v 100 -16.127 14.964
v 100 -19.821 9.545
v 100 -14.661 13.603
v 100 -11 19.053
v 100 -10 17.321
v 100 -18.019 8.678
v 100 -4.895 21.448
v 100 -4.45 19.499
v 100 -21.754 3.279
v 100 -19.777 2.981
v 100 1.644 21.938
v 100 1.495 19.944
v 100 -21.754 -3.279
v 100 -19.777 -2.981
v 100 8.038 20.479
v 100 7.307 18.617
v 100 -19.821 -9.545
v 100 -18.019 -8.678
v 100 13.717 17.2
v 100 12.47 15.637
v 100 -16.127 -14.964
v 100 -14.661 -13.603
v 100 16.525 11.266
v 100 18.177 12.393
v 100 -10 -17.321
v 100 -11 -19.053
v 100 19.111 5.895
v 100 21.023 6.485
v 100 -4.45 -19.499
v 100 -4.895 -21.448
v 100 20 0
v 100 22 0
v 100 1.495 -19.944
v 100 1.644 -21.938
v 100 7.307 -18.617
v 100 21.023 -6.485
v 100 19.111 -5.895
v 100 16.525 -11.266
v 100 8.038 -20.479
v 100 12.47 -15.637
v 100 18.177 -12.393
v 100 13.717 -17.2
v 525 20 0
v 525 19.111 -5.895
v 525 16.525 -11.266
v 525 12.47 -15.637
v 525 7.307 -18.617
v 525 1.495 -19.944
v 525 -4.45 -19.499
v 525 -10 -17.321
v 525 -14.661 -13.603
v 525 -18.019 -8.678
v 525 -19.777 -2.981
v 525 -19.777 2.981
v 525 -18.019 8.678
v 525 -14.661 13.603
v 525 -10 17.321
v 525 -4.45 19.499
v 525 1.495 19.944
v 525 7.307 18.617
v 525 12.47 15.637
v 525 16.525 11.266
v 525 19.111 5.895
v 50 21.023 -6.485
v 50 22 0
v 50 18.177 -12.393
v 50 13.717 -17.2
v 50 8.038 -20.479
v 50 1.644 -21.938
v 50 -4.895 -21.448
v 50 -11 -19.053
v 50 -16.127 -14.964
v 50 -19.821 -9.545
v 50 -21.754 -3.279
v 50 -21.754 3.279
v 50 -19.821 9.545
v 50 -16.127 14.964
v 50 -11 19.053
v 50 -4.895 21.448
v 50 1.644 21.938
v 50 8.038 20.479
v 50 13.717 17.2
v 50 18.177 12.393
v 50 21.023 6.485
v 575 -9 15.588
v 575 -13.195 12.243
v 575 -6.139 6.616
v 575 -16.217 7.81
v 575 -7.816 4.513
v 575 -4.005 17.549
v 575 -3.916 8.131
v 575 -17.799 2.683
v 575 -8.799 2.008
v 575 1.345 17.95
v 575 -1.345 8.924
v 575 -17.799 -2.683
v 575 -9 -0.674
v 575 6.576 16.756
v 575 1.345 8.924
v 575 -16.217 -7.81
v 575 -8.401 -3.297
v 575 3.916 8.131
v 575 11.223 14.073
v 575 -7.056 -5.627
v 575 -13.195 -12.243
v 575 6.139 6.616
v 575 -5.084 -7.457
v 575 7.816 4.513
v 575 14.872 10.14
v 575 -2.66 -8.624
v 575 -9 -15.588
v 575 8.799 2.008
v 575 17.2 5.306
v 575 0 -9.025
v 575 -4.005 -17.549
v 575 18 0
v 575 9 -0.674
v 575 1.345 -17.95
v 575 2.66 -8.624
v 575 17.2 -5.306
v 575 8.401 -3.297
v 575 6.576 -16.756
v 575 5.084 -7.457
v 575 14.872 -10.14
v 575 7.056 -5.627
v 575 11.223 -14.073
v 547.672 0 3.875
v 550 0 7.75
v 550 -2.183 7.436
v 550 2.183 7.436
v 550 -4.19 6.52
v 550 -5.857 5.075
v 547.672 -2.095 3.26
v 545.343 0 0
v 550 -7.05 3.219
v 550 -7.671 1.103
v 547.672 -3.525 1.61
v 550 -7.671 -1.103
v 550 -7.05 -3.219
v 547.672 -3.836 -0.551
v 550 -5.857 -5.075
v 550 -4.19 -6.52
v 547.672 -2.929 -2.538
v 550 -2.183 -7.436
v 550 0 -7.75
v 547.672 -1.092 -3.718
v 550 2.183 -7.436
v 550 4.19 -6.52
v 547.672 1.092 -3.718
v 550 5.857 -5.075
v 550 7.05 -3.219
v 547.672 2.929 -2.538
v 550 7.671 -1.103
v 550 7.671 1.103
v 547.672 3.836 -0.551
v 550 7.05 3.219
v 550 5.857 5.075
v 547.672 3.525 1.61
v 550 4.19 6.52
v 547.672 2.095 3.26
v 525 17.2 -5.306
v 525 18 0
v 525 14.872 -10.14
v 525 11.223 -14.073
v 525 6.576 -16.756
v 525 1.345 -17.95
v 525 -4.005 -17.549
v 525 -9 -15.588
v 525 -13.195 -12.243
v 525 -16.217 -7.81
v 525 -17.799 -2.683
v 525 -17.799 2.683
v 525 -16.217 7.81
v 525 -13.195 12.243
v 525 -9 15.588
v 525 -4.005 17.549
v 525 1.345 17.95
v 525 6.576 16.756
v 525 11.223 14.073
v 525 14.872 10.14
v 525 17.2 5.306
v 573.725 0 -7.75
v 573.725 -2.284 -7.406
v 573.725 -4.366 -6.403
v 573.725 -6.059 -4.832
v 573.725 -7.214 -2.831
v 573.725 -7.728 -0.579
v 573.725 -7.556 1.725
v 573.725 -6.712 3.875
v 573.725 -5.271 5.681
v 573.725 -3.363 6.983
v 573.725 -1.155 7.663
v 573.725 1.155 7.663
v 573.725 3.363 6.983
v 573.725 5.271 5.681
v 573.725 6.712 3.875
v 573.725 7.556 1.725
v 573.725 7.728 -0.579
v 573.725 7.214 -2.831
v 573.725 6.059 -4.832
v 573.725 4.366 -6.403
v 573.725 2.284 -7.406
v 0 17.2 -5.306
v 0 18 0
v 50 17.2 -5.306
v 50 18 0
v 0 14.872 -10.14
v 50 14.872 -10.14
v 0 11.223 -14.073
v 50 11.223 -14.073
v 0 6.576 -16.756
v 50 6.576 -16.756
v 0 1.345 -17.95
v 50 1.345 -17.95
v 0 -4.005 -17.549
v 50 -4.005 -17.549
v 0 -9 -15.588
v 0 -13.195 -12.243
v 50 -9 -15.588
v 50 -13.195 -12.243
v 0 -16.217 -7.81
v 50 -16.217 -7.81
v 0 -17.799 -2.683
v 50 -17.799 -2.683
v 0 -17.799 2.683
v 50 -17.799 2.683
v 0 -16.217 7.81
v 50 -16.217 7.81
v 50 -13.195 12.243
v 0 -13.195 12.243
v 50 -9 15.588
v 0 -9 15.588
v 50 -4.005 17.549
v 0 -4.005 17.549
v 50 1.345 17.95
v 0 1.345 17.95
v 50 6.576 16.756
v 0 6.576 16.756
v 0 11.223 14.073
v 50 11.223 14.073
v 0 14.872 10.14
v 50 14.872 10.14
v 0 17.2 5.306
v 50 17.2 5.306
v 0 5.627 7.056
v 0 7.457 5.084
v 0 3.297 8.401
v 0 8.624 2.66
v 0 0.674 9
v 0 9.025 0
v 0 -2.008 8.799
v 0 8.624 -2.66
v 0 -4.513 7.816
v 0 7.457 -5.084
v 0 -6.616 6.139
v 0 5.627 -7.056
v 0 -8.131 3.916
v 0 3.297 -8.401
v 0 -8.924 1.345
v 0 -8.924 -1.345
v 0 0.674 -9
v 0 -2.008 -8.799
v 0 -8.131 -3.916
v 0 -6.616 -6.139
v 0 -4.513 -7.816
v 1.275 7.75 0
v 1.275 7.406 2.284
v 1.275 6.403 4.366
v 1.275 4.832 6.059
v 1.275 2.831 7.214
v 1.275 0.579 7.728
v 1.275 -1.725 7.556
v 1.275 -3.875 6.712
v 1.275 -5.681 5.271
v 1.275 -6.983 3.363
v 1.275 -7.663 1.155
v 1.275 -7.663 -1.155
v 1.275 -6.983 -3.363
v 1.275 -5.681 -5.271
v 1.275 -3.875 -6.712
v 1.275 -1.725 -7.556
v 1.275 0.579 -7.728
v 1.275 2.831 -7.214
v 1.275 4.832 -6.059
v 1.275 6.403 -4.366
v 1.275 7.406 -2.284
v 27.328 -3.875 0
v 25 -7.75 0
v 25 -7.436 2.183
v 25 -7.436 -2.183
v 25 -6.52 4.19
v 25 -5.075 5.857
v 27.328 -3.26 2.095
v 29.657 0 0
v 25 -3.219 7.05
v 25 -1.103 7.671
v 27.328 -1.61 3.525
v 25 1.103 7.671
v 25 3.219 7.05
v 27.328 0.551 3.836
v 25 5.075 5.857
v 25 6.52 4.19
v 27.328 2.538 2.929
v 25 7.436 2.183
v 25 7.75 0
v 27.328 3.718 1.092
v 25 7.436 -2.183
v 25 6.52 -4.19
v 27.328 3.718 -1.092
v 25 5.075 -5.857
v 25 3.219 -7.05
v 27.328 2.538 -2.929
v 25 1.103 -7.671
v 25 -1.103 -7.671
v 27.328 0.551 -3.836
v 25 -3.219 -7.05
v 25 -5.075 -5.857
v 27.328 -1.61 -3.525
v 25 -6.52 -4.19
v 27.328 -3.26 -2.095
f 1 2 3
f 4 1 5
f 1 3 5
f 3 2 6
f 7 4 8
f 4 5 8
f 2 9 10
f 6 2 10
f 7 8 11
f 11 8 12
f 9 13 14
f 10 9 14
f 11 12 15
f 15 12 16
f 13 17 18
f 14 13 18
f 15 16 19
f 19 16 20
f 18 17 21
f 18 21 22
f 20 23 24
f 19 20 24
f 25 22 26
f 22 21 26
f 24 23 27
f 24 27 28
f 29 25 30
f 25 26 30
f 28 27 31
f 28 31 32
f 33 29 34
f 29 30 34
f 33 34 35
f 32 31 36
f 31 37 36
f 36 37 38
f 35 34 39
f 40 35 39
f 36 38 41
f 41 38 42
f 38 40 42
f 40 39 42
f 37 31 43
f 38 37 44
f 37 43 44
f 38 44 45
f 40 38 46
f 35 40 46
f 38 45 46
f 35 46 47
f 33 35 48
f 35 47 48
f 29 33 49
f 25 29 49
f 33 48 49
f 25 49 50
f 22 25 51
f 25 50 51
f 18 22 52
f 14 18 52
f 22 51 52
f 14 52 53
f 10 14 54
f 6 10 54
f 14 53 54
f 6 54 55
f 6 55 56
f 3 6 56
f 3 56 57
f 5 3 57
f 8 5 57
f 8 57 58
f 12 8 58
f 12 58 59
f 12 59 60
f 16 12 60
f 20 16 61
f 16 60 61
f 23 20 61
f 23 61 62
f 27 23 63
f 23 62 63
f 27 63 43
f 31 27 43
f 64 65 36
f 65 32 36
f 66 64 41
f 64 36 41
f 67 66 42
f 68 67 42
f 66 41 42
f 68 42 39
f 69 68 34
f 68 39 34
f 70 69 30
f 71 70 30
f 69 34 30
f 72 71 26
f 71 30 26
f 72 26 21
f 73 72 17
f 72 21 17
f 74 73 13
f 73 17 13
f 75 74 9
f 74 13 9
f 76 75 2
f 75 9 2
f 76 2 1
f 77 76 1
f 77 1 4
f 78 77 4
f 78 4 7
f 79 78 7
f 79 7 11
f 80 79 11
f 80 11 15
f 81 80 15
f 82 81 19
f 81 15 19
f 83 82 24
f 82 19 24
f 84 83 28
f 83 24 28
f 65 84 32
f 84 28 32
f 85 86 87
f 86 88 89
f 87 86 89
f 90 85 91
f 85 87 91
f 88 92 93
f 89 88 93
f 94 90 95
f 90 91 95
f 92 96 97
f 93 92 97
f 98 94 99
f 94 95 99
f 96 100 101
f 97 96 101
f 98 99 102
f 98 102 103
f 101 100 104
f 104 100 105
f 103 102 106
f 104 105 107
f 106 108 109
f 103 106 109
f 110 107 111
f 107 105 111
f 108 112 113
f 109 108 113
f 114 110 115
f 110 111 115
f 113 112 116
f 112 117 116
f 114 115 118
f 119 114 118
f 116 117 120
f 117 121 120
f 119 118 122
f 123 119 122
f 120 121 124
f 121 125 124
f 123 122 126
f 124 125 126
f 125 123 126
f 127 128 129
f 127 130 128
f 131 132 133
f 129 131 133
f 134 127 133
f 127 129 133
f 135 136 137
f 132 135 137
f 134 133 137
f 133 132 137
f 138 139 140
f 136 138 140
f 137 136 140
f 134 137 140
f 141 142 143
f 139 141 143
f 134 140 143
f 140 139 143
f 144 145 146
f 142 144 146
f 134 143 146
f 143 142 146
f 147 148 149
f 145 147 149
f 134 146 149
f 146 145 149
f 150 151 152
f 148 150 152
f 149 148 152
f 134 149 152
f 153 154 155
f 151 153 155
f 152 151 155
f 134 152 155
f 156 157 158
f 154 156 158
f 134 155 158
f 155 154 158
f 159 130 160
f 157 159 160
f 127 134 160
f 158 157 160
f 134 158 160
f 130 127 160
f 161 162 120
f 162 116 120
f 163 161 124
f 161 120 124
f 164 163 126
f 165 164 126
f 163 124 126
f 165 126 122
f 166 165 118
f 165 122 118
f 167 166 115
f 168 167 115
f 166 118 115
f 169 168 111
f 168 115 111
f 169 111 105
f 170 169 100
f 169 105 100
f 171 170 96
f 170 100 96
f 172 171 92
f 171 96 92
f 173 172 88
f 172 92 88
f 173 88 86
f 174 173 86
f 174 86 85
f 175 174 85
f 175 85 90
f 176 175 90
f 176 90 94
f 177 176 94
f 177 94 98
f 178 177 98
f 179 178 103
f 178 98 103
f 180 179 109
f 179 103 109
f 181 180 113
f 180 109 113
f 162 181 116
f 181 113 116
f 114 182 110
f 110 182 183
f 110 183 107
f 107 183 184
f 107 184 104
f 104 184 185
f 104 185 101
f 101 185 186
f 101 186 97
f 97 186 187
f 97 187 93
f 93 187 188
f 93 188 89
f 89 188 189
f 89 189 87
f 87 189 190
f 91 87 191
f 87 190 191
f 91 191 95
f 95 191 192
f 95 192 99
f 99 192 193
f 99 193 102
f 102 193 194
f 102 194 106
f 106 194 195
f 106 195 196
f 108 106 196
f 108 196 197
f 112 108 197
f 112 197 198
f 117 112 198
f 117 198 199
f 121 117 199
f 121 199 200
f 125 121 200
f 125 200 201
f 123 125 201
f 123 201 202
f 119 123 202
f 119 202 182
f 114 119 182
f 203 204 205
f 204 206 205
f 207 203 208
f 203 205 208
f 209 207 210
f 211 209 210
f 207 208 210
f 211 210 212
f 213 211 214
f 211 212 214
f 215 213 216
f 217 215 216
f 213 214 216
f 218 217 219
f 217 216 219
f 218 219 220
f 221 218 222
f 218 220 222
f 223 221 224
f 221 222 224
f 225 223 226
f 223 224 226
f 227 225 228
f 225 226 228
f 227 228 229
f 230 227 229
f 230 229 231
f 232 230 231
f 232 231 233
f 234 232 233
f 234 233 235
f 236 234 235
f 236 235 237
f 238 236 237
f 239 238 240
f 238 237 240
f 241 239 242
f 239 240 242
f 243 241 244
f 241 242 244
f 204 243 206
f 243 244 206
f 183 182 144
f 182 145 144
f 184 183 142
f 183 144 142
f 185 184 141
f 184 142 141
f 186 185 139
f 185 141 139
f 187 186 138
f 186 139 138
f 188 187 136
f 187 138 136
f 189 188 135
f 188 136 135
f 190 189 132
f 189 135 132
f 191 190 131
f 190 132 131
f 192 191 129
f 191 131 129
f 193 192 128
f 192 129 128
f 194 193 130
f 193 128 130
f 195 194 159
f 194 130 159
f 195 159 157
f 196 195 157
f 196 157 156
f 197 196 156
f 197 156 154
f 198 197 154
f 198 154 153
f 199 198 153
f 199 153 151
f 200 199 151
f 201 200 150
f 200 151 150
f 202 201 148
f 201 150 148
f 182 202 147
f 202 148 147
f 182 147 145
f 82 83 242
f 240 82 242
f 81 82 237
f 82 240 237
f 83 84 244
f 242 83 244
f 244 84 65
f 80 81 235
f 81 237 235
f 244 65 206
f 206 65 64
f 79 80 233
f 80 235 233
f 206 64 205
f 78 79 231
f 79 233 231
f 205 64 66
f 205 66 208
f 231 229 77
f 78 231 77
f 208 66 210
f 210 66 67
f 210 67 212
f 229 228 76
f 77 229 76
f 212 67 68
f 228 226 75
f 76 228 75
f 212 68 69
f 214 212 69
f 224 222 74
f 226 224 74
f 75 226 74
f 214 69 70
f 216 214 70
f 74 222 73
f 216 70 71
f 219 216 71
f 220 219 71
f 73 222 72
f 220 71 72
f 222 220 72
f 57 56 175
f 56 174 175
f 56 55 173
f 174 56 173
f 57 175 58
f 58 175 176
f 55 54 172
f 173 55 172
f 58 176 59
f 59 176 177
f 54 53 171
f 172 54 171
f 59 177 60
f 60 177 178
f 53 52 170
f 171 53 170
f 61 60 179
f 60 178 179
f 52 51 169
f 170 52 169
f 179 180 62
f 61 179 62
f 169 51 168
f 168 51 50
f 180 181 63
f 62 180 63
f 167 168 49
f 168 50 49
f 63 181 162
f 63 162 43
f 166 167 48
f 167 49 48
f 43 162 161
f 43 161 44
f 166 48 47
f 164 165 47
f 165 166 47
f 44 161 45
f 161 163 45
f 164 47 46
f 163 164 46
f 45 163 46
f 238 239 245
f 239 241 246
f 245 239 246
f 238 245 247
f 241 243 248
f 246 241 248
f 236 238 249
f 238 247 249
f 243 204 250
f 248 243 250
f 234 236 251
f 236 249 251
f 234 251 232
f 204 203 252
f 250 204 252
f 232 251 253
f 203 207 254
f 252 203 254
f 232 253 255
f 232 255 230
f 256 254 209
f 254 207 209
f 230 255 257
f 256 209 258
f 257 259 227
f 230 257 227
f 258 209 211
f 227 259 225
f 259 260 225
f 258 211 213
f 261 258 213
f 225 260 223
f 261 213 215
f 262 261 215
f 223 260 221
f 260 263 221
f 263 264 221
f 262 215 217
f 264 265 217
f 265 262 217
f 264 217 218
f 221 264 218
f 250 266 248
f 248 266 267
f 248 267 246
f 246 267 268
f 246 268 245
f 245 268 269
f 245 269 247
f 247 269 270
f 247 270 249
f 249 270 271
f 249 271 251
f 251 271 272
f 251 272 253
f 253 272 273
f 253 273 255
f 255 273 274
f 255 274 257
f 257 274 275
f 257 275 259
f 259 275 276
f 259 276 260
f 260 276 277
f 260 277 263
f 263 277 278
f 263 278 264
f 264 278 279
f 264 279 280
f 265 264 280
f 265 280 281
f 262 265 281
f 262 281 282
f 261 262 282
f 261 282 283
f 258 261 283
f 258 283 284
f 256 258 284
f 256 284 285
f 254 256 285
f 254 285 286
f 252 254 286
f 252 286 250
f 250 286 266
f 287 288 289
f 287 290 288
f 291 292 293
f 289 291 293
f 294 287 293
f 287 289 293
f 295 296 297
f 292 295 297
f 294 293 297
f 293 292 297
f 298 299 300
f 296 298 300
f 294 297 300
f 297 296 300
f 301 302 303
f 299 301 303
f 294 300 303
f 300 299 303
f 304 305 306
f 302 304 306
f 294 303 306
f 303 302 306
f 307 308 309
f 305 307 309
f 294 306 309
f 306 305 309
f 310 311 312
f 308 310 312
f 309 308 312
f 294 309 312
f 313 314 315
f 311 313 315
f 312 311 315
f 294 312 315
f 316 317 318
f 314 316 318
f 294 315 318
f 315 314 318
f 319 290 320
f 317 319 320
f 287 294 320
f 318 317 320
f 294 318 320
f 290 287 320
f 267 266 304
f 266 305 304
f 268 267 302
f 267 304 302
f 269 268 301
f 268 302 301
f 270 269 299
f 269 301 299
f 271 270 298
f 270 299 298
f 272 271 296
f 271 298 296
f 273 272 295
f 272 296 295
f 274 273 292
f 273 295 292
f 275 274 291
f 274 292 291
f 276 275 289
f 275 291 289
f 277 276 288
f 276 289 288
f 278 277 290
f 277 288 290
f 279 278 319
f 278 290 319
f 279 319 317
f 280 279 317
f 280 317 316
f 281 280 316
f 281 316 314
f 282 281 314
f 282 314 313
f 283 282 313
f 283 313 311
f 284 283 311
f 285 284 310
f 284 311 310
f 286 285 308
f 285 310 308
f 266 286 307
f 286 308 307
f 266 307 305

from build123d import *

# Parameters (mm, degrees)
FURO_ROSCADO_DE_M181_D                     = 15.5
FURO_ROSCADO_DE_M181_DEPTH                 = 25
FURO_ROSCADO_DE_M181_CSINK_D               = 18.05
FURO_ROSCADO_DE_M181_CSINK_ANGLE           = 90
FURO_ROSCADO_DE_M181_TIP                   = 4.656669797
FURO_ROSCADO_DE_M181_ON_FACE_2_D           = 15.5
FURO_ROSCADO_DE_M181_ON_FACE_2_DEPTH       = 25
FURO_ROSCADO_DE_M181_ON_FACE_2_CSINK_D     = 18.05
FURO_ROSCADO_DE_M181_ON_FACE_2_CSINK_ANGLE = 90
FURO_ROSCADO_DE_M181_ON_FACE_2_TIP         = 4.656669797


with BuildPart() as part:
    # Esboço1 → Revolução1 (revolve)
    with BuildSketch(Plane.XY):
        Polygon((0, 0), (0, 18), (50, 18), (50, 22), (100, 22), (100, 20), (525, 20), (525, 18), (575, 18), (575, 0), align=None)
    revolve(axis=Axis((575, 0, 0), (-1, 0, 0)))

    # Furo roscado de M181
    with Locations(Plane(origin=(0, 0, 0), x_dir=(0, -1, 0), z_dir=(-1, 0, 0))):
        with Locations((0, 0)):
            CounterSinkHole(FURO_ROSCADO_DE_M181_D / 2, FURO_ROSCADO_DE_M181_CSINK_D / 2, depth=FURO_ROSCADO_DE_M181_DEPTH, counter_sink_angle=FURO_ROSCADO_DE_M181_CSINK_ANGLE)
            with Locations((0, 0, -(FURO_ROSCADO_DE_M181_DEPTH + FURO_ROSCADO_DE_M181_TIP / 2))):  # 118° drill point
                Cone(0, FURO_ROSCADO_DE_M181_D / 2, FURO_ROSCADO_DE_M181_TIP, mode=Mode.SUBTRACT)

    # Furo roscado de M181 on face 2
    with Locations(Plane(origin=(575, 0, 0), x_dir=(0, 0, 1), z_dir=(1, 0, 0))):
        with Locations((0, 0)):
            CounterSinkHole(FURO_ROSCADO_DE_M181_ON_FACE_2_D / 2, FURO_ROSCADO_DE_M181_ON_FACE_2_CSINK_D / 2, depth=FURO_ROSCADO_DE_M181_ON_FACE_2_DEPTH, counter_sink_angle=FURO_ROSCADO_DE_M181_ON_FACE_2_CSINK_ANGLE)
            with Locations((0, 0, -(FURO_ROSCADO_DE_M181_ON_FACE_2_DEPTH + FURO_ROSCADO_DE_M181_ON_FACE_2_TIP / 2))):  # 118° drill point
                Cone(0, FURO_ROSCADO_DE_M181_ON_FACE_2_D / 2, FURO_ROSCADO_DE_M181_ON_FACE_2_TIP, mode=Mode.SUBTRACT)


solid = part.part
